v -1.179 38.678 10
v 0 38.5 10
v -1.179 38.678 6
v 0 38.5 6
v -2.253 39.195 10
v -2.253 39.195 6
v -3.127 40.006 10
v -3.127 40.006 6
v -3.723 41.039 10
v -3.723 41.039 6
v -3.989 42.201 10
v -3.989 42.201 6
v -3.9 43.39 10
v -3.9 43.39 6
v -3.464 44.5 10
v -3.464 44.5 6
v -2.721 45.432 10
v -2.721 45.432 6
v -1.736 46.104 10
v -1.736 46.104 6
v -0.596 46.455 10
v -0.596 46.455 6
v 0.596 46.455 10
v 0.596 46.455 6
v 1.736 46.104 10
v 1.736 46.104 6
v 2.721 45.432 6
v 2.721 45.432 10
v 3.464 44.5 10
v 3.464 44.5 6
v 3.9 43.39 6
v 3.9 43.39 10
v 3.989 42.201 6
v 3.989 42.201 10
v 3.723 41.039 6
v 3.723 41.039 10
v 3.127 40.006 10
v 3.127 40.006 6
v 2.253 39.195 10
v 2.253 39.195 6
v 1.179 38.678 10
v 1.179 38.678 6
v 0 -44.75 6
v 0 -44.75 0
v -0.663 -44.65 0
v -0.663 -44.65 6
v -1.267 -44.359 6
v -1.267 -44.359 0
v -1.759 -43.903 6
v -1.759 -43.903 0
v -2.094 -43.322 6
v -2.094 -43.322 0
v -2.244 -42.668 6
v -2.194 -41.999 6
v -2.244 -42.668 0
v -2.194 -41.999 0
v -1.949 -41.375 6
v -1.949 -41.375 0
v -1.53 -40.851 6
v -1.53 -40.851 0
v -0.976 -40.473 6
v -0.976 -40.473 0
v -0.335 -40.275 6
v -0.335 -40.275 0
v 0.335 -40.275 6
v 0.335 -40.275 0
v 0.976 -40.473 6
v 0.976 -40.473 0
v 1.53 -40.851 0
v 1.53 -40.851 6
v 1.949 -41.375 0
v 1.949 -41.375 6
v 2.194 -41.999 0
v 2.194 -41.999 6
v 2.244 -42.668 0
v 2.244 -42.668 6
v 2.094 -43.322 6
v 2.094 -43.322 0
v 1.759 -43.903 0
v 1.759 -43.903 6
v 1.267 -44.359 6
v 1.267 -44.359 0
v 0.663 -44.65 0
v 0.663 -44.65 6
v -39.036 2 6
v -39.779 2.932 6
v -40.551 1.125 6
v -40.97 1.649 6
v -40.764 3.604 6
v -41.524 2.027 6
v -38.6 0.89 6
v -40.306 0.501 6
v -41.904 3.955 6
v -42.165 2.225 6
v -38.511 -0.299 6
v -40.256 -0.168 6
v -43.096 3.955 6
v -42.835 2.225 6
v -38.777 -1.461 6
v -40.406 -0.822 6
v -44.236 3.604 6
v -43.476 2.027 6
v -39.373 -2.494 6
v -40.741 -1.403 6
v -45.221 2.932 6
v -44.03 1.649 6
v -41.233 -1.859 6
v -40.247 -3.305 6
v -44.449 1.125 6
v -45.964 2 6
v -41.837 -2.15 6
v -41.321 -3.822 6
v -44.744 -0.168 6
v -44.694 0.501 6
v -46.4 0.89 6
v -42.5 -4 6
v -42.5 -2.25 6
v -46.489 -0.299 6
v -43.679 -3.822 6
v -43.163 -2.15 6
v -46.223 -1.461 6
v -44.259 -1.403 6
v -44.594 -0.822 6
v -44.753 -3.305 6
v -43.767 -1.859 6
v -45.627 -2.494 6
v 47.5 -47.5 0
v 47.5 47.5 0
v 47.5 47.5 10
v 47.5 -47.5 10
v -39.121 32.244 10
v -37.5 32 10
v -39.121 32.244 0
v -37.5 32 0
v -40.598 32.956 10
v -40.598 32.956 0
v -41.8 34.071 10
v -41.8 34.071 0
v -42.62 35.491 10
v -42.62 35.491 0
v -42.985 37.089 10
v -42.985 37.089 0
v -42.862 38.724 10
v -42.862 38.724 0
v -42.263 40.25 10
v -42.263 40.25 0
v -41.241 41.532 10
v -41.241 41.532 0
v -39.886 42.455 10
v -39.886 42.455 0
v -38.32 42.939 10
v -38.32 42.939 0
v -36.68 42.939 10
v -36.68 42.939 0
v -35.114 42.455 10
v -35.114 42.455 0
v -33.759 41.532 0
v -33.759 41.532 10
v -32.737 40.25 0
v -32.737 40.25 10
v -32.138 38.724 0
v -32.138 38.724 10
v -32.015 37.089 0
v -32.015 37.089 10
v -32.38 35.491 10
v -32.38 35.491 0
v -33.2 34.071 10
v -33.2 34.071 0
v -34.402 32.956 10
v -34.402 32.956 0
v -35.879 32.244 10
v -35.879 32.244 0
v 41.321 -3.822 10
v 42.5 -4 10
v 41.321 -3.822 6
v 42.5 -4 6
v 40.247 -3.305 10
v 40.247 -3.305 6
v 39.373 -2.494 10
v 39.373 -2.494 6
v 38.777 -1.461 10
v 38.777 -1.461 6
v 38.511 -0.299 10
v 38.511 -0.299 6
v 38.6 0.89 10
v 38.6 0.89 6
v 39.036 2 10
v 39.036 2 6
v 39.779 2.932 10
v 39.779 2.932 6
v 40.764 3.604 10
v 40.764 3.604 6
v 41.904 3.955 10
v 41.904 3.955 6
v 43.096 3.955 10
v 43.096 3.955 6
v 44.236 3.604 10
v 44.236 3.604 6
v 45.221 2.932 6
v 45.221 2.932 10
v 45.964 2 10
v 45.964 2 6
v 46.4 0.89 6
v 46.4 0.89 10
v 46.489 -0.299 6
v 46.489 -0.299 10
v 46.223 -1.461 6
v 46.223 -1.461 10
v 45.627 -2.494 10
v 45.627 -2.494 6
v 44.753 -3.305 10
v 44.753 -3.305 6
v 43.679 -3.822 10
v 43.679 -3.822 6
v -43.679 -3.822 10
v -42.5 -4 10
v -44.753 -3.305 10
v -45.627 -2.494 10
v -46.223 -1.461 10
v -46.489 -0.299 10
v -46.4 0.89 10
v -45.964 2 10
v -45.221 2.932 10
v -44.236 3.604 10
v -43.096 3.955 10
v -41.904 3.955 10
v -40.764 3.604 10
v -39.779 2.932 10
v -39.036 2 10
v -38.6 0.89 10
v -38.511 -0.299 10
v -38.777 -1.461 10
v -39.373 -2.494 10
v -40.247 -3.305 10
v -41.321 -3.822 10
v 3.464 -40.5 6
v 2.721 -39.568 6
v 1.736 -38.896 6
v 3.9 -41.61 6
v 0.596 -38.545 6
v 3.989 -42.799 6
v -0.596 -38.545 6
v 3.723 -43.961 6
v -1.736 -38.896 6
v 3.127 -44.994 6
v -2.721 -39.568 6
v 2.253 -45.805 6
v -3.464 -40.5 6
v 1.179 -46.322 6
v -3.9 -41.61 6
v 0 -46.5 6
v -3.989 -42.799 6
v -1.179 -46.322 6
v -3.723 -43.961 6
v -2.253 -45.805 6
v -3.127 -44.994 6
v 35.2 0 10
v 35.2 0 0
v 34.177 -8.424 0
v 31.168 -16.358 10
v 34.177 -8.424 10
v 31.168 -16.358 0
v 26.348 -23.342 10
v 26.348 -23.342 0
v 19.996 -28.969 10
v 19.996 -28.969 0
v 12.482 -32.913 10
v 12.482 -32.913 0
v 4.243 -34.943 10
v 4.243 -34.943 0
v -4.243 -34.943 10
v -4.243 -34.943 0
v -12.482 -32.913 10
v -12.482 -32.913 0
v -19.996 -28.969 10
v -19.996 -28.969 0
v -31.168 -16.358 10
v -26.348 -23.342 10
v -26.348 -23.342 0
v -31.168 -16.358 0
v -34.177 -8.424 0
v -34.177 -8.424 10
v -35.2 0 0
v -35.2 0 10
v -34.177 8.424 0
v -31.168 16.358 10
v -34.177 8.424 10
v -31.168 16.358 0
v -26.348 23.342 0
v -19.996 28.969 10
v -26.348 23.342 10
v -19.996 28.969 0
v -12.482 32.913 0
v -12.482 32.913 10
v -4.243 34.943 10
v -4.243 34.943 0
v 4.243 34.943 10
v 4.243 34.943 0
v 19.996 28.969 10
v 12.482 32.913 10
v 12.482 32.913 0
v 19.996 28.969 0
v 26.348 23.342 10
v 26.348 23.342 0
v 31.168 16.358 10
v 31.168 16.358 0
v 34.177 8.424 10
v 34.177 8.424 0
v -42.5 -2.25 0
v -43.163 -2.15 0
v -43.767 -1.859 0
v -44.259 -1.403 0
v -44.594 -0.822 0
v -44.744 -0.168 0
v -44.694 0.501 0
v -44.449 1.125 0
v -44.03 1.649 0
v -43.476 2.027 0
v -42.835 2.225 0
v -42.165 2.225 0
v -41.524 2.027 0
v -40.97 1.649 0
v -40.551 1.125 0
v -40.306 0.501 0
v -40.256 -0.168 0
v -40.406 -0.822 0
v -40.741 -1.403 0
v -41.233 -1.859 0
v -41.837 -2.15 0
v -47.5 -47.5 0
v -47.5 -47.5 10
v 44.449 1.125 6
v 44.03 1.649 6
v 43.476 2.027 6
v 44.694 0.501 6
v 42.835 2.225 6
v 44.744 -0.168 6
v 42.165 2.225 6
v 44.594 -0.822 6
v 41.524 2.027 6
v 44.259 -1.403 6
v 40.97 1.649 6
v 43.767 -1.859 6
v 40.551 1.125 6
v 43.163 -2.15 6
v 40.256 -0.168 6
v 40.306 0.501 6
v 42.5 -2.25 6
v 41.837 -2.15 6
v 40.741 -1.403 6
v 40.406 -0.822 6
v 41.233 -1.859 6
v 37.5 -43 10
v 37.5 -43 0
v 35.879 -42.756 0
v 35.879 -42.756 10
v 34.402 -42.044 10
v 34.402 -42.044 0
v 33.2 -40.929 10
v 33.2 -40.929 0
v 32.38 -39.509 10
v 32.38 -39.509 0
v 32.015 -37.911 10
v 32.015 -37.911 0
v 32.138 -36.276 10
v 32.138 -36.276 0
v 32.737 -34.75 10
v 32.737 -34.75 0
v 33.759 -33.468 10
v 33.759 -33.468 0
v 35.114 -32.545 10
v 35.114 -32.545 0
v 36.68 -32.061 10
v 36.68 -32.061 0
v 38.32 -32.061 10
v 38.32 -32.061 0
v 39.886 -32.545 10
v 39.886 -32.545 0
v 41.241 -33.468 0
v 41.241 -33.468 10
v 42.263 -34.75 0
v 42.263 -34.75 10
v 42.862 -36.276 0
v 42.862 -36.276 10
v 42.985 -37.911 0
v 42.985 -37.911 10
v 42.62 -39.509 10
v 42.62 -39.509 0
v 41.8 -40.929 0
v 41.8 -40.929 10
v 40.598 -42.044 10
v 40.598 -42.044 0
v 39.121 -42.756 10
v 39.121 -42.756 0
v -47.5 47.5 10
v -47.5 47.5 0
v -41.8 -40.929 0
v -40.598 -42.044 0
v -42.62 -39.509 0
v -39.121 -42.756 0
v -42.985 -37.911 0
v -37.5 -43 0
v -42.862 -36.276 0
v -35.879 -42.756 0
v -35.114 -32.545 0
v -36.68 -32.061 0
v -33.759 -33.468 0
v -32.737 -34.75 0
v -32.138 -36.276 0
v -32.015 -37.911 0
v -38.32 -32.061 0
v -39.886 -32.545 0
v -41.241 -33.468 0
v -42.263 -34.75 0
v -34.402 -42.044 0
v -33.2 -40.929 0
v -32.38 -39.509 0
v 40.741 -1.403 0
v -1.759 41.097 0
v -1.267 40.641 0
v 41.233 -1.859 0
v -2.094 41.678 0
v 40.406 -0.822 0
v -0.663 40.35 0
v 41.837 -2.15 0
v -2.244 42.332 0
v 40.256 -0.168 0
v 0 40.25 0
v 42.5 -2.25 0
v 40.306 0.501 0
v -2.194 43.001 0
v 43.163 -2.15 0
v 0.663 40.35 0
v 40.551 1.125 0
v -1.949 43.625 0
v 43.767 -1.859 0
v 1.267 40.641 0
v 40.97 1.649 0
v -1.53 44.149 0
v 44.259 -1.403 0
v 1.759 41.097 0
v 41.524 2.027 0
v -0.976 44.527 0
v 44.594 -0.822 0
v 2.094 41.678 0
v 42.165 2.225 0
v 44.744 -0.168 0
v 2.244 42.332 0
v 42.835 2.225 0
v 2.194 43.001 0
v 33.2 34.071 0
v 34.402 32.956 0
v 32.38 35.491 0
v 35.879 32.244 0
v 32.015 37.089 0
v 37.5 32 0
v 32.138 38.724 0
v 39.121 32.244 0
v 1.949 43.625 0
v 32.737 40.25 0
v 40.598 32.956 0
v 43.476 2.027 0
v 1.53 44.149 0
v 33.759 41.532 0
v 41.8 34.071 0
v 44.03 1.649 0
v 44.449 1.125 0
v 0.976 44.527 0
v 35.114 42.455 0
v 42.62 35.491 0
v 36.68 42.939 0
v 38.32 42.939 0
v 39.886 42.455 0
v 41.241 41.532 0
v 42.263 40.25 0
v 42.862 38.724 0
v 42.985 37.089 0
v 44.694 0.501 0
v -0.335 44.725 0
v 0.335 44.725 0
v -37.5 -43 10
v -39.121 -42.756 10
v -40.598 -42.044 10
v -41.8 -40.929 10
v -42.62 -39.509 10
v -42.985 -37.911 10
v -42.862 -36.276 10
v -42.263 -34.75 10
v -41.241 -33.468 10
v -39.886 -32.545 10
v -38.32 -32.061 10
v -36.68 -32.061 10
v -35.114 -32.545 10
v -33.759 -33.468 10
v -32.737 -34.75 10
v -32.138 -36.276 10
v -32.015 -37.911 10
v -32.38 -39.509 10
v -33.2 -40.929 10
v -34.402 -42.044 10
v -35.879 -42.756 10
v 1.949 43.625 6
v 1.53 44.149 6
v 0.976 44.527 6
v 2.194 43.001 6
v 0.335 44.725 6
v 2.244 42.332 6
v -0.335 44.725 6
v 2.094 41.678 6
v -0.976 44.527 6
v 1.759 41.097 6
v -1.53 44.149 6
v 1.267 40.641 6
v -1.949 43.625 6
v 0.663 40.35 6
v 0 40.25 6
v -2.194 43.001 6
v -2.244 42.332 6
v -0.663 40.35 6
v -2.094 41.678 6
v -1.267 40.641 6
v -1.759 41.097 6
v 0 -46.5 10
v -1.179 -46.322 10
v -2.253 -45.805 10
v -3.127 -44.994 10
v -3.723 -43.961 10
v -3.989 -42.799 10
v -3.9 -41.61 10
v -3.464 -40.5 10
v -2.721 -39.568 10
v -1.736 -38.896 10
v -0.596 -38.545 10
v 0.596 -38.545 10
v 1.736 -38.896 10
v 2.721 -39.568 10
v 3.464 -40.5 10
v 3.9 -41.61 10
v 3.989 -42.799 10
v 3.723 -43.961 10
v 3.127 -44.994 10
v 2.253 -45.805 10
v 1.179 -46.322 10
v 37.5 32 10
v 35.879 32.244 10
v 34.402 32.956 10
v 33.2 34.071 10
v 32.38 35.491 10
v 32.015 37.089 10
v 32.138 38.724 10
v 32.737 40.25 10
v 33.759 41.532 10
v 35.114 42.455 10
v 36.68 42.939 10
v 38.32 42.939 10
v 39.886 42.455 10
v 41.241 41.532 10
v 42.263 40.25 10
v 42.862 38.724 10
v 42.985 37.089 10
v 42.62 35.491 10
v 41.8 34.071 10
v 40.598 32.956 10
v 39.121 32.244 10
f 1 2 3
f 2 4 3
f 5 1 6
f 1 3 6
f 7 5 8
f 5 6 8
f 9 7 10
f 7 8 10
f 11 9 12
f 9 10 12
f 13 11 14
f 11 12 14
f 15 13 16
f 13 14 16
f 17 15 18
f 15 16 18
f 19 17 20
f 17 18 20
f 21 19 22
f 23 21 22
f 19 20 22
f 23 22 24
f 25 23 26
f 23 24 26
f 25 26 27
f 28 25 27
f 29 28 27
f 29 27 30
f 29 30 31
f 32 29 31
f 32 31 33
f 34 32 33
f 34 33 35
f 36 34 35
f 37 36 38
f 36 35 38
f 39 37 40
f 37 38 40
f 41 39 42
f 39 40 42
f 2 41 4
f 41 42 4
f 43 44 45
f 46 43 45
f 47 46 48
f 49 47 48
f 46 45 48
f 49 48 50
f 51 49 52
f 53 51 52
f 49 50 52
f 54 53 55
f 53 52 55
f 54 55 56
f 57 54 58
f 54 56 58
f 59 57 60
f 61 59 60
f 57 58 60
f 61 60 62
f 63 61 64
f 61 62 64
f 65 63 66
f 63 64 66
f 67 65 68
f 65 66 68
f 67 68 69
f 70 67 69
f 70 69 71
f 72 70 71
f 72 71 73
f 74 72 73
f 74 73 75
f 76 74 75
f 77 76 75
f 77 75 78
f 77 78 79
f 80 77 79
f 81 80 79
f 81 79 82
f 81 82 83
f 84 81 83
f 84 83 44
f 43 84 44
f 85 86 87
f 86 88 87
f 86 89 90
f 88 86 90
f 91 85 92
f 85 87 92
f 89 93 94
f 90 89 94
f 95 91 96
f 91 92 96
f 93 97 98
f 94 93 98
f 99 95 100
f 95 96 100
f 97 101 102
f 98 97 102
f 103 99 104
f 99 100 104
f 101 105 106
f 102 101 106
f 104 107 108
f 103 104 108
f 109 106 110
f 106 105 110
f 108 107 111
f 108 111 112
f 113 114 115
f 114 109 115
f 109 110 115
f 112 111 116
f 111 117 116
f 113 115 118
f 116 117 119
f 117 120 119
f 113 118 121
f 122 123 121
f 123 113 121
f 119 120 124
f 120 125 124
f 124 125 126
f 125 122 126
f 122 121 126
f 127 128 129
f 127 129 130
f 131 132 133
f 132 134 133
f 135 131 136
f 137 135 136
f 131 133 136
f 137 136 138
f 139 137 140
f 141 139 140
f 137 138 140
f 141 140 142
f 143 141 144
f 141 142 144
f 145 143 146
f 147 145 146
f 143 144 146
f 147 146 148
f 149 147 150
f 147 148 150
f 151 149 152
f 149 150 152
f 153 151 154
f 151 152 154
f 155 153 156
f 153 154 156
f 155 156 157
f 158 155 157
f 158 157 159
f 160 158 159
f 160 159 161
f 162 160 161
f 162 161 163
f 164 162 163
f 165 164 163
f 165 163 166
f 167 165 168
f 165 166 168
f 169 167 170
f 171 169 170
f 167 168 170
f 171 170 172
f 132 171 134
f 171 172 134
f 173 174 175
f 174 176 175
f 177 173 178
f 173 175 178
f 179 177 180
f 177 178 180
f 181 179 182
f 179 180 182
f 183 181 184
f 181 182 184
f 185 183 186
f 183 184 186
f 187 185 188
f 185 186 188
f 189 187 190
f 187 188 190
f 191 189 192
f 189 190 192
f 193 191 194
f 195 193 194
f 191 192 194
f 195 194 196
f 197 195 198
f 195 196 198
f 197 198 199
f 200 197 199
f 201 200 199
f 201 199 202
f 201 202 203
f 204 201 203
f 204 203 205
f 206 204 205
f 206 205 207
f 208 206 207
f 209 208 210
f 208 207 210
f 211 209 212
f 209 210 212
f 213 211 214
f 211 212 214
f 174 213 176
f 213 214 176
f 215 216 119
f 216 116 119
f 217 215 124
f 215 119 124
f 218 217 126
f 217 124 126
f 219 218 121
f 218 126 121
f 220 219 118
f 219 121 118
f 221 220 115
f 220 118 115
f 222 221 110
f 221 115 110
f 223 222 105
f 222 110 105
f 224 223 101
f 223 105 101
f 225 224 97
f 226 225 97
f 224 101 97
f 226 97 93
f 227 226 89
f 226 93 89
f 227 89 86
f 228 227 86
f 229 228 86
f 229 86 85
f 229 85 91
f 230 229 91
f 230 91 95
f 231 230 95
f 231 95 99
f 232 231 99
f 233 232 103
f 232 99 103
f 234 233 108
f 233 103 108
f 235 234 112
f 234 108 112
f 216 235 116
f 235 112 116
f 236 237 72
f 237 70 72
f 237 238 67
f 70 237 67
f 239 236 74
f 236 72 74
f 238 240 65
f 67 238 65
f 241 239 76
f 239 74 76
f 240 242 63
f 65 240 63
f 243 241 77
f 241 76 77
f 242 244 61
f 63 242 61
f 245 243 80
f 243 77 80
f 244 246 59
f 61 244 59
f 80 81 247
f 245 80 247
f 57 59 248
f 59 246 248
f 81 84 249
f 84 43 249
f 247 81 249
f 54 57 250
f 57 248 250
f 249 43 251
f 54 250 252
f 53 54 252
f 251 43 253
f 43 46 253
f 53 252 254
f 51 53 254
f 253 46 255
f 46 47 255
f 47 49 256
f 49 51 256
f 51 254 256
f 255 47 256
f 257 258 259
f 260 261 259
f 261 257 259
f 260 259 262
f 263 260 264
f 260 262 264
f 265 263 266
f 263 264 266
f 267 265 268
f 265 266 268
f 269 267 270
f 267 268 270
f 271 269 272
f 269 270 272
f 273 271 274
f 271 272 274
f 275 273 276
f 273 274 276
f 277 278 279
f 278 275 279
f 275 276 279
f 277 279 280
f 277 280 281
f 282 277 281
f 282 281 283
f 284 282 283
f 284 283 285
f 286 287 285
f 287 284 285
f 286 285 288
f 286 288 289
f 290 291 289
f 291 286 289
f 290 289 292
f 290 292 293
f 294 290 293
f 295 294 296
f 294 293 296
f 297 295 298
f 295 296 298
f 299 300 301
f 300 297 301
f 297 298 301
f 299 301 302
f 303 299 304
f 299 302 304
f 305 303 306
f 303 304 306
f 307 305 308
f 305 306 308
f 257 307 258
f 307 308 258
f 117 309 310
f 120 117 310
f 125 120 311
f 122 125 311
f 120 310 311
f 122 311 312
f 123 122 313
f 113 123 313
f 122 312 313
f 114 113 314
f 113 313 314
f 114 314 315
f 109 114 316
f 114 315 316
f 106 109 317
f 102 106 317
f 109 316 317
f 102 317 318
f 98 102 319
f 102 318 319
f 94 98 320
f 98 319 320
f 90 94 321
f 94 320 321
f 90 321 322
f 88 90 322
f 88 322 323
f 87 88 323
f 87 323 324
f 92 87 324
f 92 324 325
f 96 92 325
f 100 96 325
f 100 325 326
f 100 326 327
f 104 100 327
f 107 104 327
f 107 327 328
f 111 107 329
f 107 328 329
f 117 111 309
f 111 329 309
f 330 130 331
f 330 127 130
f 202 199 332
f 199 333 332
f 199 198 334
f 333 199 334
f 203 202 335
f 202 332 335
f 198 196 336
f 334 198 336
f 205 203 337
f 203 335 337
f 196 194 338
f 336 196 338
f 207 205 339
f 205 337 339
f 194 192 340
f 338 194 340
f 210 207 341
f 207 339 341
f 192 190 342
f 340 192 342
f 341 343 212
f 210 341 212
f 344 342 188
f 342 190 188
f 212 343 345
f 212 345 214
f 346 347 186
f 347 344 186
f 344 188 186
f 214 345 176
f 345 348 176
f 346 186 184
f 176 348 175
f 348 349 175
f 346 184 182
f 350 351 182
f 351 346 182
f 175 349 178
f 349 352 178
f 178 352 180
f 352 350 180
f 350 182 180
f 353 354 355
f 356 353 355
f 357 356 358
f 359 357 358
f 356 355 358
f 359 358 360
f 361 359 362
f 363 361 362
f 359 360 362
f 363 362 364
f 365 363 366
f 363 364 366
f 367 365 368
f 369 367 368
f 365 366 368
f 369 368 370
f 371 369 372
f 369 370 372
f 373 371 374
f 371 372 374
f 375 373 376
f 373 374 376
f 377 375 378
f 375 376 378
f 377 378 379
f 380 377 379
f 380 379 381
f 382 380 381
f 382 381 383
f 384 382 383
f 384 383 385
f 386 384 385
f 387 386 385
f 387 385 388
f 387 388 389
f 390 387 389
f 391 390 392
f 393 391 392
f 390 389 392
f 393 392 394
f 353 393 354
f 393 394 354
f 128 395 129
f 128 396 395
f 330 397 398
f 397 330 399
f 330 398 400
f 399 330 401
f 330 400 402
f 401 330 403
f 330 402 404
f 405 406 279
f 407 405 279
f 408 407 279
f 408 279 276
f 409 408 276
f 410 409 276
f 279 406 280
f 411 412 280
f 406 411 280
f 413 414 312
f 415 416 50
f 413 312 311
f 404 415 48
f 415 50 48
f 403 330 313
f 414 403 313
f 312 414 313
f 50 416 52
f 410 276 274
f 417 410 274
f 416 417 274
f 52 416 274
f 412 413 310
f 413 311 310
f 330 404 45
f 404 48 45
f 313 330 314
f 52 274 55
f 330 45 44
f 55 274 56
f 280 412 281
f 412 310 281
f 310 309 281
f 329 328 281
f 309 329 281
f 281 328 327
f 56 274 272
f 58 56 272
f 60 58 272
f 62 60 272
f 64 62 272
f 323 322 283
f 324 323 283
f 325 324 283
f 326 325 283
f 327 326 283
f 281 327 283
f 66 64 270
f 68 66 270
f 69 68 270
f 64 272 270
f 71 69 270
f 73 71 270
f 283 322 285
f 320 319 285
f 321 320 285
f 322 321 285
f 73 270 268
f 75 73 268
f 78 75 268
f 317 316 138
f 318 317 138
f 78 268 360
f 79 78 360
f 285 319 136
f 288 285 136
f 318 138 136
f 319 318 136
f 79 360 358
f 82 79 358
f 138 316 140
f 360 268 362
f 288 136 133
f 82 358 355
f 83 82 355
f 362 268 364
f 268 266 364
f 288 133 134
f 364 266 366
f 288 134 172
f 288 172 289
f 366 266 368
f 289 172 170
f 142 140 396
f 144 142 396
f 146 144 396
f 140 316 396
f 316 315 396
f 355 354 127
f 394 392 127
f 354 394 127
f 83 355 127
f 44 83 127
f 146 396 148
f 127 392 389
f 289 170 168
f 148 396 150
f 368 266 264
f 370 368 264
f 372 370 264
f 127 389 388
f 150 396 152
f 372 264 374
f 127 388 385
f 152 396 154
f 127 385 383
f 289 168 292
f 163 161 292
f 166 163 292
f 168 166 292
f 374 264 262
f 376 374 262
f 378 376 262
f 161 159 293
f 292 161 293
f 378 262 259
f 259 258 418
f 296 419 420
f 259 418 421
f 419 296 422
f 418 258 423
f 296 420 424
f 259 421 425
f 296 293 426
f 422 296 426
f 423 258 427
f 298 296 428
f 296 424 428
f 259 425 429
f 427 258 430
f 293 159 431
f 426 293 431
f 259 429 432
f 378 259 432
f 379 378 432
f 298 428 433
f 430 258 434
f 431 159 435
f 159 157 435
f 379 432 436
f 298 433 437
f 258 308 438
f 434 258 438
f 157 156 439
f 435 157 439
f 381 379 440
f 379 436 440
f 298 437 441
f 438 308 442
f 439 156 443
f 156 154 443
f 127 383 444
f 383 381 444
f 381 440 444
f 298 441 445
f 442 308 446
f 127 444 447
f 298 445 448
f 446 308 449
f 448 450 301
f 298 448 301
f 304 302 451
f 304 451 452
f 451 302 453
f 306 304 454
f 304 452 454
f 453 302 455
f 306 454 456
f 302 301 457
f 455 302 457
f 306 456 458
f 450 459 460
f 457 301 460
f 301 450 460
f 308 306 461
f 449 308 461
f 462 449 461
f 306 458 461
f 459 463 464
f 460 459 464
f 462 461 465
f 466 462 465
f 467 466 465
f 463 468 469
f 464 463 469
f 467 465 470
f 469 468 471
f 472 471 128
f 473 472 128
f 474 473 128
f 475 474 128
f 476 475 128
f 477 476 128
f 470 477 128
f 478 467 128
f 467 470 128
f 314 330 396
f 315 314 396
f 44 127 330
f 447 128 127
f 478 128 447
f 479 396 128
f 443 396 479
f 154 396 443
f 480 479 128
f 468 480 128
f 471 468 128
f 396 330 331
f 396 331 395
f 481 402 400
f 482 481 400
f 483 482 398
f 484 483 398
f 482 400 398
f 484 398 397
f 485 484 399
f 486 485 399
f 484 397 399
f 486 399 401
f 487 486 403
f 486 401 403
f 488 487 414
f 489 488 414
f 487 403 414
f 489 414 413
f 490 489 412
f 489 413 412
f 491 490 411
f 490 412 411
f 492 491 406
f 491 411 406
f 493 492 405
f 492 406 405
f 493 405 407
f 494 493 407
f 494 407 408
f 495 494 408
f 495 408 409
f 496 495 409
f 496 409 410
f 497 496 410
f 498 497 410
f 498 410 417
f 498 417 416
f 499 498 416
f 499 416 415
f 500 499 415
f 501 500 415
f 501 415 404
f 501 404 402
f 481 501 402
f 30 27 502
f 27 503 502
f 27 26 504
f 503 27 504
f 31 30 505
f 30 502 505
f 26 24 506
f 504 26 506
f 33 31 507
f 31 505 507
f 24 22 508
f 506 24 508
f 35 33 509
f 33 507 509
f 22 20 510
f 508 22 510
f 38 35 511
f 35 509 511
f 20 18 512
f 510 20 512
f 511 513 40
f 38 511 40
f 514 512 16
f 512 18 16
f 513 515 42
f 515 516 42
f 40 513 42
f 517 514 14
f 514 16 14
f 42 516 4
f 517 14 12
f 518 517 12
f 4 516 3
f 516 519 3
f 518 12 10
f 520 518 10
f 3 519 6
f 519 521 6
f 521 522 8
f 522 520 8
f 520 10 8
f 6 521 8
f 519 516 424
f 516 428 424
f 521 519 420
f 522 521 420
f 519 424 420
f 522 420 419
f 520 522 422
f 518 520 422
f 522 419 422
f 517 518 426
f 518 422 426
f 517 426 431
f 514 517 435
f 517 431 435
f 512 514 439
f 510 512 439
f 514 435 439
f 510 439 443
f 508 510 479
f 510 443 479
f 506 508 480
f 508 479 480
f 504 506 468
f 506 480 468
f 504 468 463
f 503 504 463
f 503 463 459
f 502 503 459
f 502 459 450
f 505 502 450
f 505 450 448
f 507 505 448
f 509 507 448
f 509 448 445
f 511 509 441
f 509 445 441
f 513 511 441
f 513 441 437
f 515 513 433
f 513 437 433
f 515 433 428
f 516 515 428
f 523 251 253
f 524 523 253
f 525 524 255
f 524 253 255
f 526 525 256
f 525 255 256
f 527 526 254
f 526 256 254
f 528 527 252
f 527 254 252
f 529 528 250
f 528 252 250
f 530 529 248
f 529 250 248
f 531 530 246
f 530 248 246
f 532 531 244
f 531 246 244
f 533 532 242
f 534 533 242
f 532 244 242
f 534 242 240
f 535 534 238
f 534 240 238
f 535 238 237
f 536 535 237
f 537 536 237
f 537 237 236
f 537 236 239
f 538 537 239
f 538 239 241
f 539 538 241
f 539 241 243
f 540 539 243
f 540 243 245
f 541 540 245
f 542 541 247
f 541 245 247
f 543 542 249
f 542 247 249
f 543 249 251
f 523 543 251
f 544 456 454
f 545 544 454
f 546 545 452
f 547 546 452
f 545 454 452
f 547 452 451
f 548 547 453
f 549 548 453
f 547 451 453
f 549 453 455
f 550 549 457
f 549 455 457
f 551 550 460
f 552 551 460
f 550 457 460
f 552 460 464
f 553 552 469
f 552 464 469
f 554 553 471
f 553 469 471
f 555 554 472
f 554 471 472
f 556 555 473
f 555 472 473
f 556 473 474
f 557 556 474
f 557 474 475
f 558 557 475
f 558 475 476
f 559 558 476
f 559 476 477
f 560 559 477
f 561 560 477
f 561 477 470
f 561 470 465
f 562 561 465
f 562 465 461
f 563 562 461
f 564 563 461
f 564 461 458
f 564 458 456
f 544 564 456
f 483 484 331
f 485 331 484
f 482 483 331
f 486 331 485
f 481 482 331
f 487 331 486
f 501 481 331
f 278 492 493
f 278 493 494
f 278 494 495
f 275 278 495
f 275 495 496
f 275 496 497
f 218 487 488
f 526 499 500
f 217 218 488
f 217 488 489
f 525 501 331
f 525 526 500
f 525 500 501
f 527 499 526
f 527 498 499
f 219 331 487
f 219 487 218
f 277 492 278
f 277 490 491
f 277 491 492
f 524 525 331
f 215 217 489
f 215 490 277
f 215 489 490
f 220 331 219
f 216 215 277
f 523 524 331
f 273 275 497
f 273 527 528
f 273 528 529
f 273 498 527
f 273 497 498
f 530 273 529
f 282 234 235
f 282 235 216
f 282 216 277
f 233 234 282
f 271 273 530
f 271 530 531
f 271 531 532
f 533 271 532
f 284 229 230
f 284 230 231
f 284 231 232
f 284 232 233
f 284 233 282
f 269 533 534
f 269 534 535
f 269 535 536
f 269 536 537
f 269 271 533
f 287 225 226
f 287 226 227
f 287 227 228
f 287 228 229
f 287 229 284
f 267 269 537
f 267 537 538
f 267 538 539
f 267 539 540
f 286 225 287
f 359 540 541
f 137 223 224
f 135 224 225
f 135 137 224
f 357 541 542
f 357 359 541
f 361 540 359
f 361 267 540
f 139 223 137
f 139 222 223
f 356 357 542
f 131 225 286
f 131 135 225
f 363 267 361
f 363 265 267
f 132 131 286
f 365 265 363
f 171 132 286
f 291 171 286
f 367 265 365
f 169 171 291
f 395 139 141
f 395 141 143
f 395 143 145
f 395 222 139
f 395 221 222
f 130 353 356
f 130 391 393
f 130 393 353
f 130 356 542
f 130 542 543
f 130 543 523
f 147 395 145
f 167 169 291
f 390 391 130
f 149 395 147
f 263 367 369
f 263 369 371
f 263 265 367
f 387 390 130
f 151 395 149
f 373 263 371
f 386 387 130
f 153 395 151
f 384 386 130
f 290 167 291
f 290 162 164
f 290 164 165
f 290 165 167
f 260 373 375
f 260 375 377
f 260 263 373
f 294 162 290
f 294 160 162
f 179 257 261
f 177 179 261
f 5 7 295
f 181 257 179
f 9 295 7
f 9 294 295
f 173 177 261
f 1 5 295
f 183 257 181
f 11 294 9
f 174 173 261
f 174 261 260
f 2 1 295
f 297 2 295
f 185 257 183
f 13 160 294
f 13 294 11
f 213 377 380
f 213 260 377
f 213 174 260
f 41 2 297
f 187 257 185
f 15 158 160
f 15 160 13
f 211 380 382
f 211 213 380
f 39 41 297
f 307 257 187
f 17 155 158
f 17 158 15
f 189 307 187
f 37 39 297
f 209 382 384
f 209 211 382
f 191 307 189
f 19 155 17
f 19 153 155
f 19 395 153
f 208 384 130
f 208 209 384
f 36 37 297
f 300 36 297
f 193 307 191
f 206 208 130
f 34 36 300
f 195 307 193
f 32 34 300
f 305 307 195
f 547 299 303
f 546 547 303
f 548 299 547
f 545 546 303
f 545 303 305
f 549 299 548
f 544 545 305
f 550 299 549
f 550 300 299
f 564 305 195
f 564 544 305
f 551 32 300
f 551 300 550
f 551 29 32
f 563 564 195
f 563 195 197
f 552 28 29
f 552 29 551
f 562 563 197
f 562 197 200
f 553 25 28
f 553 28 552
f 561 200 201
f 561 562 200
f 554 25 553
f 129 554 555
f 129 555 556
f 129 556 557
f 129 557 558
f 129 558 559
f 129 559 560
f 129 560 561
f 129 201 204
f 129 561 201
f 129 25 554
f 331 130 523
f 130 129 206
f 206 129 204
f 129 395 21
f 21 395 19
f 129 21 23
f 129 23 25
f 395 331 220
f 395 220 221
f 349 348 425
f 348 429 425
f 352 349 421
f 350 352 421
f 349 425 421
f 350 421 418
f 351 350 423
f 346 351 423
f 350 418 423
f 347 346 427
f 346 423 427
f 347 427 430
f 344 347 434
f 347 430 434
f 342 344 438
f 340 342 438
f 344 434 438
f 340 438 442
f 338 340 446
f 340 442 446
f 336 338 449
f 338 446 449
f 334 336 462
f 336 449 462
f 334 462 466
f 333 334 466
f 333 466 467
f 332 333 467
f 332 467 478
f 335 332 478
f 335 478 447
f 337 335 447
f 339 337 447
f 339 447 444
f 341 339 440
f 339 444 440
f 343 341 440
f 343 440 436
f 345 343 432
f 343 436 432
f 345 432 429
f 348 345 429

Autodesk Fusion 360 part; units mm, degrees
sketch "Sketch1" plane through (0, 0, 0) normal (0, 0, 1) x (1, 0, 0)
  line L0 (-47.5, 47.5) -> (47.5, 47.5)
  line L1 (47.5, 47.5) -> (47.5, -47.5)
  line L2 (47.5, -47.5) -> (-47.5, -47.5)
  line L3 (-47.5, -47.5) -> (-47.5, 47.5)
  line L4 (-47.5, 47.5) -> (47.5, -47.5) construction
  line L5 (-47.5, -47.5) -> (47.5, 47.5) construction
  circle A0 centre (0, 0) radius 35.2
  dimension "d1" = 95
  dimension "d2" = 95
  dimension "d3" = 70.4
extrude "Extrude1" add sketch "Sketch1" along normal blind 10
sketch "Sketch2" plane through (0, 0, 10) normal (0, 0, 1) x (-1, 0, 0)
  circle A0 centre (0, 0) radius 35.2
  line L0 (47.5, 47.5) -> (-47.5, 47.5)
  line L1 (-47.5, 47.5) -> (-47.5, -47.5)
  line L2 (-47.5, -47.5) -> (47.5, -47.5)
  line L3 (47.5, -47.5) -> (47.5, 47.5)
  line L4 (42.5, 0) -> (-42.5, 0) construction
  line L5 (0, -42.5) -> (0, 42.5) construction
  point P0 (0, -42.5)
  point P1 (42.5, 0)
  point P2 (0, 42.5)
  point P3 (-42.5, 0)
  dimension "d7" = 5
  dimension "d8" = 5
  dimension "d9" = 5
  dimension "d10" = 5
hole "Hole1" at (-42.5, 0, 10) at (0, 42.5, 10) at (42.5, 0, 10) at (0, -42.5, 10) direction (0, 0, -1) diameter 4.5 depth 15 tip angle 118 counterbore diameter 8 counterbore depth 4
sketch "Sketch3" plane through (0, 0, 10) normal (0, 0, 1) x (-1, 0, 0)
  circle A0 centre (-42.5, 0) radius 4
  circle A1 centre (42.5, 0) radius 4
  circle A2 centre (0, -42.5) radius 4
  circle A3 centre (0, 42.5) radius 4
  circle A4 centre (0, 0) radius 35.2
  line L0 (47.5, 47.5) -> (-47.5, 47.5)
  line L1 (-47.5, 47.5) -> (-47.5, -47.5)
  line L2 (-47.5, -47.5) -> (47.5, -47.5)
  line L3 (47.5, -47.5) -> (47.5, 47.5)
  line L4 (37.5, -37.5) -> (37.5, 37.5) construction
  line L5 (37.5, 37.5) -> (-37.5, 37.5) construction
  line L6 (-37.5, 37.5) -> (-37.5, -37.5) construction
  line L7 (-37.5, -37.5) -> (37.5, -37.5) construction
  point P0 (37.5, -37.5)
  point P1 (-37.5, -37.5)
  point P2 (-37.5, 37.5)
  point P3 (37.5, 37.5)
  dimension "d16" = 10
  dimension "d17" = 10
  dimension "d18" = 10
  dimension "d19" = 10
hole "Hole2" at (-37.5, 37.5, 10) at (37.5, 37.5, 10) at (37.5, -37.5, 10) at (-37.5, -37.5, 10) direction (0, 0, -1) diameter 11 end through all
equation "d2 = d1"
equation "d8 = d7"
equation "d9 = d7"
equation "d10 = d7"
equation "d17 = d16"
equation "d18 = d16"
equation "d19 = d16"
